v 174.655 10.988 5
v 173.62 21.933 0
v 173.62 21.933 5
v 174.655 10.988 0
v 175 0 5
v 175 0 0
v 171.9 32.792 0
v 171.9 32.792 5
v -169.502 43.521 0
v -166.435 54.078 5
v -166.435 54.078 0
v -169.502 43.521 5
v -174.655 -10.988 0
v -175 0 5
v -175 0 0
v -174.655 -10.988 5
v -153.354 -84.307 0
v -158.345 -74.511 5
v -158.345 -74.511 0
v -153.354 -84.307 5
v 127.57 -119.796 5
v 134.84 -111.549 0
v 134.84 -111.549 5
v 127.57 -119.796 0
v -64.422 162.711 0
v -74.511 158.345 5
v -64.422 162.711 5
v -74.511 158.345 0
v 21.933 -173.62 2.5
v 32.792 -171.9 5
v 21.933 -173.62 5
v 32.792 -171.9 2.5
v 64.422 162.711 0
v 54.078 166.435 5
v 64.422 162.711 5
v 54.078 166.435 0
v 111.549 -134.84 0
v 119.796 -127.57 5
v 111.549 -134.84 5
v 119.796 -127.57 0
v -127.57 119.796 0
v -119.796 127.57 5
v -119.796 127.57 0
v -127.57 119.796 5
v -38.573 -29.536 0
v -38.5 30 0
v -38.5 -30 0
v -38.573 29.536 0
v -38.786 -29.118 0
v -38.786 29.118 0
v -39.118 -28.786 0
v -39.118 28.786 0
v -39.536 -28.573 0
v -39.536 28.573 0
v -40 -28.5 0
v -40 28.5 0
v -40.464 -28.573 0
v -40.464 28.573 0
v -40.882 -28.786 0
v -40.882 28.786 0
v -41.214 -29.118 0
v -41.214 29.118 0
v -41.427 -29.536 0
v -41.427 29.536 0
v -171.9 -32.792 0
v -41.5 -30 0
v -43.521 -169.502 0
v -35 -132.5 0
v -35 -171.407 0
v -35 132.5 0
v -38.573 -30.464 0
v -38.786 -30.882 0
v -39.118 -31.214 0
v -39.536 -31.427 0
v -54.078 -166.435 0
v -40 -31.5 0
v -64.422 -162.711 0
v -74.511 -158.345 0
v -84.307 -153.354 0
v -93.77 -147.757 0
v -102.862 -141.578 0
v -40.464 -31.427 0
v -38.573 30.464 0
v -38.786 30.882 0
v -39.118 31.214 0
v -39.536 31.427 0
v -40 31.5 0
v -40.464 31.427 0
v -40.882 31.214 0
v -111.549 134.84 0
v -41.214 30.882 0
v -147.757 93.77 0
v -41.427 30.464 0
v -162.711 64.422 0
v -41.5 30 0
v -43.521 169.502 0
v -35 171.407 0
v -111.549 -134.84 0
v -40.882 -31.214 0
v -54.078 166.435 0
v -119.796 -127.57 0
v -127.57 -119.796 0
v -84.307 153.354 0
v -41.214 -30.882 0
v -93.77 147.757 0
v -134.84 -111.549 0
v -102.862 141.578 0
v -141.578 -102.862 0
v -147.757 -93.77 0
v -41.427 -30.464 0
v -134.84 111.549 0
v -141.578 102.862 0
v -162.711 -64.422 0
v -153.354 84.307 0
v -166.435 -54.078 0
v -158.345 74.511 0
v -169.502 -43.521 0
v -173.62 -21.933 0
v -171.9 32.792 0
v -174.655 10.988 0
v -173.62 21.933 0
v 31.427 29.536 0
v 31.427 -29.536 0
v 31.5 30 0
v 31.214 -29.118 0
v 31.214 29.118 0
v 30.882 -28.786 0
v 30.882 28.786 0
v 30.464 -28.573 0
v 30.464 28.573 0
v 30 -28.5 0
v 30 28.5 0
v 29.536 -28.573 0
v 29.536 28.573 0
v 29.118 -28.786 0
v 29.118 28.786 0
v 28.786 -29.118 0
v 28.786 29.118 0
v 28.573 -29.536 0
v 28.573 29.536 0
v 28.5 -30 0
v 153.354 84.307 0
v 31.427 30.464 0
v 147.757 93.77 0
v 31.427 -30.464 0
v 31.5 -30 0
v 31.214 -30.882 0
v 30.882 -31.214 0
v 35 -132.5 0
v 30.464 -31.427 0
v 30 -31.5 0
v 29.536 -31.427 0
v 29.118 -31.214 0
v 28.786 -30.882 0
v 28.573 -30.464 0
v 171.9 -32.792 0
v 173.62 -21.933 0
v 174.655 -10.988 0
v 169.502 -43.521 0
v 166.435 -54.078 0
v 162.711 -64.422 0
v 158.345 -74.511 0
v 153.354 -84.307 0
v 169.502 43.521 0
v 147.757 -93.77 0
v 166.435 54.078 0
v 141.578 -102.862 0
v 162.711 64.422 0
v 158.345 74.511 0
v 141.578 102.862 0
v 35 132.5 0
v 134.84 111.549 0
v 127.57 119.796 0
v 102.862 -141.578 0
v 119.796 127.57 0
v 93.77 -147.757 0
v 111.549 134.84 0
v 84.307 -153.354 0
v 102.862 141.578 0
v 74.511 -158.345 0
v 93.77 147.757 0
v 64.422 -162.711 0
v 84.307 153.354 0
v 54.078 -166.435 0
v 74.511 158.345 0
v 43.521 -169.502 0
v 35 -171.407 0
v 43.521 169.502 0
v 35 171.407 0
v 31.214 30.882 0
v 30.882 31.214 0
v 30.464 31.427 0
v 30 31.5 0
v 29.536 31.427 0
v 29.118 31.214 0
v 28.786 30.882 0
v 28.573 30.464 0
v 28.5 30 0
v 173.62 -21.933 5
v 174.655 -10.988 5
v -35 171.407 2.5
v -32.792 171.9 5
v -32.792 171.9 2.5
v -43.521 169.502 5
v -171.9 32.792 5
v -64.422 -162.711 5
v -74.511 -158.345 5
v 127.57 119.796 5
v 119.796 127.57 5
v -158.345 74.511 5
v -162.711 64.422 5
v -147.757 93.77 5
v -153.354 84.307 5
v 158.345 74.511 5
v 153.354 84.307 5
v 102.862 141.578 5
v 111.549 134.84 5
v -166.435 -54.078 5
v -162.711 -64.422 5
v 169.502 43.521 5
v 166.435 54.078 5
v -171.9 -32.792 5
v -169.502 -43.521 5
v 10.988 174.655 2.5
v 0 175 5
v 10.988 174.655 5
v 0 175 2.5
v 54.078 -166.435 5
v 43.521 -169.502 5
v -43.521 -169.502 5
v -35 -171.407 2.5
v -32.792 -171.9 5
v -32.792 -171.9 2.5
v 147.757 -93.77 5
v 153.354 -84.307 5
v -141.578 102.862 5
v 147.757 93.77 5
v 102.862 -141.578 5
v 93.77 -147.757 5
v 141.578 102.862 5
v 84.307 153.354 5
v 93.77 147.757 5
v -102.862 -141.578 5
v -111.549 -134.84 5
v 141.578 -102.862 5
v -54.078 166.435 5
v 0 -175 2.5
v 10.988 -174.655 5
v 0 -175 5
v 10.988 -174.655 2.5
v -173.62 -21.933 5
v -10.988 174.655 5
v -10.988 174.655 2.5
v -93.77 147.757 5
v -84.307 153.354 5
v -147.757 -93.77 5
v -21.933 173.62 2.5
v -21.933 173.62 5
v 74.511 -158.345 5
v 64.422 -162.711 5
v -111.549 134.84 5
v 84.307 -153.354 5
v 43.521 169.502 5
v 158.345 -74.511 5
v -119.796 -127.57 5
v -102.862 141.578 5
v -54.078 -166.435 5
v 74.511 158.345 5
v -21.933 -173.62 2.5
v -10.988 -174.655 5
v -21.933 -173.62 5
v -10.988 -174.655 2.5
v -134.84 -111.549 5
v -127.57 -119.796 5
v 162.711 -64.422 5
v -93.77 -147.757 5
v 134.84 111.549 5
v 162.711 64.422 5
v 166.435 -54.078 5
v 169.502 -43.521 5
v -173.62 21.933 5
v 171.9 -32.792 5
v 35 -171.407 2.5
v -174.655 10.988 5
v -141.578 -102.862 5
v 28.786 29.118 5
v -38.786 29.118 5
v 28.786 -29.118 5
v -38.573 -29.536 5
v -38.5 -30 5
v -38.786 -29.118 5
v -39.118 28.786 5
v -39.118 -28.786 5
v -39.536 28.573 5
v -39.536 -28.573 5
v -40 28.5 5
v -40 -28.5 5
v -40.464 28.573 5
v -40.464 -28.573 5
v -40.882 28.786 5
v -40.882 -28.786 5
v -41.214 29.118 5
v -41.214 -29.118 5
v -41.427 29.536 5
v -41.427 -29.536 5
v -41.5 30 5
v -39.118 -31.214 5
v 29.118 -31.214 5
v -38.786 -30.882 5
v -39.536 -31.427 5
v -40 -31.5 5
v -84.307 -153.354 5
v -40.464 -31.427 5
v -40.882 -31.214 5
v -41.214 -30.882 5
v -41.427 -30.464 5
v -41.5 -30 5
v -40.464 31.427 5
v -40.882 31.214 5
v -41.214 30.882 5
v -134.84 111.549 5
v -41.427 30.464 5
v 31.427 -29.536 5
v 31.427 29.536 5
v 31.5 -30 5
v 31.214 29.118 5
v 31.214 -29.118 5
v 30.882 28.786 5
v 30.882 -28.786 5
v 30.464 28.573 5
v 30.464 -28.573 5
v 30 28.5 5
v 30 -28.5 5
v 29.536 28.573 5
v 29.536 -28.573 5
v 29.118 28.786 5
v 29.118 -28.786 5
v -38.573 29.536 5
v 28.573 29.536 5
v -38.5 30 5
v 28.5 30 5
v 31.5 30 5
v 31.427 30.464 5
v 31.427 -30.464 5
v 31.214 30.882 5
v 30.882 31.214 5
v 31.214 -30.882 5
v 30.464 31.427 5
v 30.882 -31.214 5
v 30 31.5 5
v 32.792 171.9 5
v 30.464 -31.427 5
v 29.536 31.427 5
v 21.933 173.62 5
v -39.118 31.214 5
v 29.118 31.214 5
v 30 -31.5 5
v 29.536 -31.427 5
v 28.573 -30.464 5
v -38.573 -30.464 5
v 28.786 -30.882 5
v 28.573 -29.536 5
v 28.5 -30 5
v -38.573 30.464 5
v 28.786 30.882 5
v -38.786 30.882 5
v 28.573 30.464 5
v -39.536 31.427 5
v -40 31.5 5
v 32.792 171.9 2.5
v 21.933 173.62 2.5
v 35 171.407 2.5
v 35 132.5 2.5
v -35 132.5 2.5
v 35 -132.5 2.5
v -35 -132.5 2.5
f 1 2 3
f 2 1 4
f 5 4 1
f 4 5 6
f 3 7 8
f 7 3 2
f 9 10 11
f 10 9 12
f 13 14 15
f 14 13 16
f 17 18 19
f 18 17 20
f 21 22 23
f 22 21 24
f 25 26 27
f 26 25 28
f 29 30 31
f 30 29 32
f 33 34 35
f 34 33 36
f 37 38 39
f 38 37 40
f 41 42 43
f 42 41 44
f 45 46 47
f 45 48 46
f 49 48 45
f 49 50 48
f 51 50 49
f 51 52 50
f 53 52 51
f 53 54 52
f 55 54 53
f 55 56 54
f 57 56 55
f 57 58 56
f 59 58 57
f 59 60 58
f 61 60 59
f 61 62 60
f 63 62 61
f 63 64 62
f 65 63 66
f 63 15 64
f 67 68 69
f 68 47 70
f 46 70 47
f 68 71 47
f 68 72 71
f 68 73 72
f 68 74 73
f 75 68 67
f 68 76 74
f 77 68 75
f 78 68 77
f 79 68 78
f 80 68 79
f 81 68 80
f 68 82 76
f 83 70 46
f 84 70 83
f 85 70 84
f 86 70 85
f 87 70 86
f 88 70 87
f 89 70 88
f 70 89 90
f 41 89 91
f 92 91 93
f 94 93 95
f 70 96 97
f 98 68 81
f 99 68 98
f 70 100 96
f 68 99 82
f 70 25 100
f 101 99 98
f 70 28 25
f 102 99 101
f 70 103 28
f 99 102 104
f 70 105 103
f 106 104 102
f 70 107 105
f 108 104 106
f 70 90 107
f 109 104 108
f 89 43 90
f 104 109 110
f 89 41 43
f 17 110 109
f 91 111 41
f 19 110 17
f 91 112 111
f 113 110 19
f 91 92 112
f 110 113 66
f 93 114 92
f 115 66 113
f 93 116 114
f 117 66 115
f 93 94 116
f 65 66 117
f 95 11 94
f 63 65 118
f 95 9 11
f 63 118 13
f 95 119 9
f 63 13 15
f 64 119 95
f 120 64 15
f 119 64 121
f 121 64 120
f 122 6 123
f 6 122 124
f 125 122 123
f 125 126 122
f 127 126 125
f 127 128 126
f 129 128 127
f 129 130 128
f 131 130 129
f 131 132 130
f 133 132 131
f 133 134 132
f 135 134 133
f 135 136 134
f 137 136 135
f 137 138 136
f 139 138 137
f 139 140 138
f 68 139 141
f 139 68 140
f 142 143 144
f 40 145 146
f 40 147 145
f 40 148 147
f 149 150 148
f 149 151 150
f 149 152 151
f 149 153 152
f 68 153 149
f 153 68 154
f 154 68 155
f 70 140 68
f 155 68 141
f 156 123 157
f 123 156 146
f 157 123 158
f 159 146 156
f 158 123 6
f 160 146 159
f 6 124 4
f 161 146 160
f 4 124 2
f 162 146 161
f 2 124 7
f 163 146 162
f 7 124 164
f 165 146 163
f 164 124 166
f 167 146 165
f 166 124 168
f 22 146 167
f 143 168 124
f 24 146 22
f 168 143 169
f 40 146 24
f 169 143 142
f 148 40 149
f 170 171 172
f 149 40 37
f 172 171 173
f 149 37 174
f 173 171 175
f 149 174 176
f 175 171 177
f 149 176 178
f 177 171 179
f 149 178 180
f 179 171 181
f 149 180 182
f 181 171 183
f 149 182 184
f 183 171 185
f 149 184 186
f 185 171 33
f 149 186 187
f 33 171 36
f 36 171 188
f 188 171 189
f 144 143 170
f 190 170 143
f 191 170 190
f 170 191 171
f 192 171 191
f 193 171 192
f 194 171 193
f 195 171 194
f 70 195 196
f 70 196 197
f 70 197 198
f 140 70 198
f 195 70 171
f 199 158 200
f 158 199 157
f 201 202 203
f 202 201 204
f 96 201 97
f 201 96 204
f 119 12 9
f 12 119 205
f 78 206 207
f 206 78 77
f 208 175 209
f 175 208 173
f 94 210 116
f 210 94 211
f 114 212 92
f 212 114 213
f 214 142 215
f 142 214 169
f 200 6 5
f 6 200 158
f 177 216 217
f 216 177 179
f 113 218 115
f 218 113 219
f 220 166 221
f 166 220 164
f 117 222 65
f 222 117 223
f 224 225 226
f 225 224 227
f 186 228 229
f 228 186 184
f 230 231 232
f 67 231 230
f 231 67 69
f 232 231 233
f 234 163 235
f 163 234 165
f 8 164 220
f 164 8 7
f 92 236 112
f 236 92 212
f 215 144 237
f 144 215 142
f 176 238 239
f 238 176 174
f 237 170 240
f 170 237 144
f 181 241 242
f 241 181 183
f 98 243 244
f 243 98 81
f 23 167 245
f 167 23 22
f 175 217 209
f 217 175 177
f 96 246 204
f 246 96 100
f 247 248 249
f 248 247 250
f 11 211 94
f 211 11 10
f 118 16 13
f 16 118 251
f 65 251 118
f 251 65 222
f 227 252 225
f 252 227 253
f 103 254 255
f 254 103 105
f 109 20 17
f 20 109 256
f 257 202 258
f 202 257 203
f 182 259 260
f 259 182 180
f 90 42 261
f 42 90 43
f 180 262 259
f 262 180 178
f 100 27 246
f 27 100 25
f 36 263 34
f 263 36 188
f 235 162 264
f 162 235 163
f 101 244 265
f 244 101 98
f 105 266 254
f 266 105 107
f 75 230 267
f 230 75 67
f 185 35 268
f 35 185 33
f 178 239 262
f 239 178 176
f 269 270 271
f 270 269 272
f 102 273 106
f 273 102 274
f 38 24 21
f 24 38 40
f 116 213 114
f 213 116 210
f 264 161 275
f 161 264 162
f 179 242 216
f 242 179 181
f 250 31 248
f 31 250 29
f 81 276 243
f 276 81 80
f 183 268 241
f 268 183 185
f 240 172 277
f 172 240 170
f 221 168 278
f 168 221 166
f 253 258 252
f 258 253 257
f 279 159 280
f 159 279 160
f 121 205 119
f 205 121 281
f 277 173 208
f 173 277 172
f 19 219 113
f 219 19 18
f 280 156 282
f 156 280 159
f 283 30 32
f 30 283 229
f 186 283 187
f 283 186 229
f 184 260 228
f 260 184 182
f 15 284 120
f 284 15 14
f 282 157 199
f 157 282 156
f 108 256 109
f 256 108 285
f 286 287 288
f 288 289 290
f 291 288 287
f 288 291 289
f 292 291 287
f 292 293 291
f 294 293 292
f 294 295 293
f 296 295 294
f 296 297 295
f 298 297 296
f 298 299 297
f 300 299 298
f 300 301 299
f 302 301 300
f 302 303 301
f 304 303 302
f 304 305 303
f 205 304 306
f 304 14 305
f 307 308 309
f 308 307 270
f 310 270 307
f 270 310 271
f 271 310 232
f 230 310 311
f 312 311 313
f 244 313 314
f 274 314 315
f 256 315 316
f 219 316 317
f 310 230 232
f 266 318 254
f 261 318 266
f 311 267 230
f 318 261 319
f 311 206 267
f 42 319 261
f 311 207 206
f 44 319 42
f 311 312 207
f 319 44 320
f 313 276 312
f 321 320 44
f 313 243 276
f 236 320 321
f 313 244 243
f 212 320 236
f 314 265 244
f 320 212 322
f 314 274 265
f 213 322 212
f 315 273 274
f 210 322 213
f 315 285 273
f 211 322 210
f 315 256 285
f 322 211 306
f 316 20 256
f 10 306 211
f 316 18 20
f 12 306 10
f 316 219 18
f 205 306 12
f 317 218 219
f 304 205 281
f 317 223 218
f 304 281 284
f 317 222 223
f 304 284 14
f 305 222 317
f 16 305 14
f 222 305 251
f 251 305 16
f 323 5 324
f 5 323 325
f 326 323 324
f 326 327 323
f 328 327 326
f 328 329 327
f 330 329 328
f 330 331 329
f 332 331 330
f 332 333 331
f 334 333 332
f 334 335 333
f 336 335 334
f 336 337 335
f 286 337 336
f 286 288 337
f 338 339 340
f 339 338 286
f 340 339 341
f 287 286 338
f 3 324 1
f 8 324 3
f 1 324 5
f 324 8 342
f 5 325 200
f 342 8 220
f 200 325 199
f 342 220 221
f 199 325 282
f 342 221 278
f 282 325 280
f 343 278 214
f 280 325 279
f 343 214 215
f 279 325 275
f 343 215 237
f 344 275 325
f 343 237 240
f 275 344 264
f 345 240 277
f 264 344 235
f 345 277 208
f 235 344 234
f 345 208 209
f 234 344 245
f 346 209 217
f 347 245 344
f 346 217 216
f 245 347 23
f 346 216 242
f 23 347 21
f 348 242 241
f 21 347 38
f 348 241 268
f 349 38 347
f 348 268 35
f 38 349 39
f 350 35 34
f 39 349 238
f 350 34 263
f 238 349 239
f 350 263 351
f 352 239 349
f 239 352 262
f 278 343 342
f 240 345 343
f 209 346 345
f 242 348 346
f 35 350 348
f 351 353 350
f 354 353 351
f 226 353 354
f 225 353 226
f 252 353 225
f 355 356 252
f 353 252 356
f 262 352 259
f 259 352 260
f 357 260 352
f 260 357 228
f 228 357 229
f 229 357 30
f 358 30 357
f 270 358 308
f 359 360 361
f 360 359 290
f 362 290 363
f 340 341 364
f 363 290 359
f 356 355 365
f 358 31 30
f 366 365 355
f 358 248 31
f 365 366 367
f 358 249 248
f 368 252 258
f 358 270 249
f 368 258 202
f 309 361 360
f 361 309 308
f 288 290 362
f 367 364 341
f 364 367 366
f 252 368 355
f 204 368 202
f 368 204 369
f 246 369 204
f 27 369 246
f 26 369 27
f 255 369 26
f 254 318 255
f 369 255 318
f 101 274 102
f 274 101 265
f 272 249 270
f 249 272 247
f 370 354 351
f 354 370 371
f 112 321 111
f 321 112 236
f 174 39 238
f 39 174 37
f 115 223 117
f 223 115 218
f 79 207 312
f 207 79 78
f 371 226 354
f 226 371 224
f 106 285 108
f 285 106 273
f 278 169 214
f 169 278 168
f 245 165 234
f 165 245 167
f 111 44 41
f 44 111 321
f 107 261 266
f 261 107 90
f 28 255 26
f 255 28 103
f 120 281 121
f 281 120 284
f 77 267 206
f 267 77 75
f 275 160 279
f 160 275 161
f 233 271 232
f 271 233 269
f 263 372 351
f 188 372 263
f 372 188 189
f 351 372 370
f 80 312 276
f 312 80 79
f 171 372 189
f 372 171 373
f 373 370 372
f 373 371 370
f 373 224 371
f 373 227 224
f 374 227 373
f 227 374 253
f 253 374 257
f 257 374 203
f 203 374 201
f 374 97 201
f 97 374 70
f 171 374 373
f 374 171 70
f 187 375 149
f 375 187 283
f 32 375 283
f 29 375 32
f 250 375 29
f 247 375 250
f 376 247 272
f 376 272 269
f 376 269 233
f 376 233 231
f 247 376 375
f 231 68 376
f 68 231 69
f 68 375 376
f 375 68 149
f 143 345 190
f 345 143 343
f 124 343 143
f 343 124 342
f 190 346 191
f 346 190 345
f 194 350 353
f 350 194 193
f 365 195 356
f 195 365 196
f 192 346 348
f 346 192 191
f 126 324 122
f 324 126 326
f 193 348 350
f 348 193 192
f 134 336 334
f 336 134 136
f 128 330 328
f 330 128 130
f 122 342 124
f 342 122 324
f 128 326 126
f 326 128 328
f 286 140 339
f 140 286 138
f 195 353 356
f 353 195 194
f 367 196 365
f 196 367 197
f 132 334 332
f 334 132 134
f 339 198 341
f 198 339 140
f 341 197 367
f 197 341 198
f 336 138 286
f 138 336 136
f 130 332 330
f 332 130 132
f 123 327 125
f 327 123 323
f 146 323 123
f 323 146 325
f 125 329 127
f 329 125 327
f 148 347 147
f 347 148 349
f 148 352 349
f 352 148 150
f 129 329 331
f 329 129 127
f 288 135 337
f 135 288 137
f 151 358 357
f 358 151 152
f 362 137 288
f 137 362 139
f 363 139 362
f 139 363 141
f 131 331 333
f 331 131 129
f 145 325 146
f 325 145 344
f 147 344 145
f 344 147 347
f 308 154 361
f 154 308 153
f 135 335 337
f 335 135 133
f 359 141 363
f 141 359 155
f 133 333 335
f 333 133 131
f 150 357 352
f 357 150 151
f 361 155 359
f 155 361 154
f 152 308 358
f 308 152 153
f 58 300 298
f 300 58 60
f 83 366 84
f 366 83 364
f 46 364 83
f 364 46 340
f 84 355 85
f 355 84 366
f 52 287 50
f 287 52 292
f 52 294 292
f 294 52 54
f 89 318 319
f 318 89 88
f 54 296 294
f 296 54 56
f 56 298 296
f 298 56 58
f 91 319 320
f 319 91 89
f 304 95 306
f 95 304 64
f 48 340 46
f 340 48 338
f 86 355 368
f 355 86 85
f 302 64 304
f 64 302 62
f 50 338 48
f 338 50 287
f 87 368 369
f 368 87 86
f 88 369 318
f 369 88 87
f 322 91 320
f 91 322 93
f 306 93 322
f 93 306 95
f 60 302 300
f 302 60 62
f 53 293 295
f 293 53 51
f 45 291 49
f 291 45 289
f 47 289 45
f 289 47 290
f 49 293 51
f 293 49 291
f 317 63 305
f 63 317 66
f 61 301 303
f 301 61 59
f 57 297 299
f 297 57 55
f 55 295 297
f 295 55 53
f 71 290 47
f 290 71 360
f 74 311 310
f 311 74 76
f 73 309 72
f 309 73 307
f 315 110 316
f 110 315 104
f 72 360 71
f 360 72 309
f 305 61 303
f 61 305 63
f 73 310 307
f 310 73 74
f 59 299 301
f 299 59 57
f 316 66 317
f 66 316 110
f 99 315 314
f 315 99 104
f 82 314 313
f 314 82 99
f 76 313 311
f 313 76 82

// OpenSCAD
// NFEC Robot Chassis - 3D Printable Blueprint
// Language: OpenSCAD
// You can copy this code into OpenSCAD (a free software) to instantly generate a 3D printable STL file of your robot's body.

// Variables (in mm)
base_radius = 175;   // 35cm diameter
base_thickness = 5;  // 5mm thick acrylic/3d print
motor_width = 25;
motor_length = 60;
wheel_radius = 40;

module base_plate() {
    difference() {
        // Main circular body
        cylinder(h=base_thickness, r=base_radius, $fn=100);
        
        // Cutout for Left Wheel
        translate([0, base_radius - 20, -1])
            cube([motor_length+10, motor_width+20, base_thickness+2], center=true);
            
        // Cutout for Right Wheel
        translate([0, -(base_radius - 20), -1])
            cube([motor_length+10, motor_width+20, base_thickness+2], center=true);
            
        // Drill holes for Raspberry Pi Mounting
        translate([30, 30, -1]) cylinder(h=10, r=1.5, $fn=20);
        translate([30, -30, -1]) cylinder(h=10, r=1.5, $fn=20);
        translate([-40, 30, -1]) cylinder(h=10, r=1.5, $fn=20);
        translate([-40, -30, -1]) cylinder(h=10, r=1.5, $fn=20);
    }
}

// Render the 3D Blueprint
color("DarkGray") base_plate();
